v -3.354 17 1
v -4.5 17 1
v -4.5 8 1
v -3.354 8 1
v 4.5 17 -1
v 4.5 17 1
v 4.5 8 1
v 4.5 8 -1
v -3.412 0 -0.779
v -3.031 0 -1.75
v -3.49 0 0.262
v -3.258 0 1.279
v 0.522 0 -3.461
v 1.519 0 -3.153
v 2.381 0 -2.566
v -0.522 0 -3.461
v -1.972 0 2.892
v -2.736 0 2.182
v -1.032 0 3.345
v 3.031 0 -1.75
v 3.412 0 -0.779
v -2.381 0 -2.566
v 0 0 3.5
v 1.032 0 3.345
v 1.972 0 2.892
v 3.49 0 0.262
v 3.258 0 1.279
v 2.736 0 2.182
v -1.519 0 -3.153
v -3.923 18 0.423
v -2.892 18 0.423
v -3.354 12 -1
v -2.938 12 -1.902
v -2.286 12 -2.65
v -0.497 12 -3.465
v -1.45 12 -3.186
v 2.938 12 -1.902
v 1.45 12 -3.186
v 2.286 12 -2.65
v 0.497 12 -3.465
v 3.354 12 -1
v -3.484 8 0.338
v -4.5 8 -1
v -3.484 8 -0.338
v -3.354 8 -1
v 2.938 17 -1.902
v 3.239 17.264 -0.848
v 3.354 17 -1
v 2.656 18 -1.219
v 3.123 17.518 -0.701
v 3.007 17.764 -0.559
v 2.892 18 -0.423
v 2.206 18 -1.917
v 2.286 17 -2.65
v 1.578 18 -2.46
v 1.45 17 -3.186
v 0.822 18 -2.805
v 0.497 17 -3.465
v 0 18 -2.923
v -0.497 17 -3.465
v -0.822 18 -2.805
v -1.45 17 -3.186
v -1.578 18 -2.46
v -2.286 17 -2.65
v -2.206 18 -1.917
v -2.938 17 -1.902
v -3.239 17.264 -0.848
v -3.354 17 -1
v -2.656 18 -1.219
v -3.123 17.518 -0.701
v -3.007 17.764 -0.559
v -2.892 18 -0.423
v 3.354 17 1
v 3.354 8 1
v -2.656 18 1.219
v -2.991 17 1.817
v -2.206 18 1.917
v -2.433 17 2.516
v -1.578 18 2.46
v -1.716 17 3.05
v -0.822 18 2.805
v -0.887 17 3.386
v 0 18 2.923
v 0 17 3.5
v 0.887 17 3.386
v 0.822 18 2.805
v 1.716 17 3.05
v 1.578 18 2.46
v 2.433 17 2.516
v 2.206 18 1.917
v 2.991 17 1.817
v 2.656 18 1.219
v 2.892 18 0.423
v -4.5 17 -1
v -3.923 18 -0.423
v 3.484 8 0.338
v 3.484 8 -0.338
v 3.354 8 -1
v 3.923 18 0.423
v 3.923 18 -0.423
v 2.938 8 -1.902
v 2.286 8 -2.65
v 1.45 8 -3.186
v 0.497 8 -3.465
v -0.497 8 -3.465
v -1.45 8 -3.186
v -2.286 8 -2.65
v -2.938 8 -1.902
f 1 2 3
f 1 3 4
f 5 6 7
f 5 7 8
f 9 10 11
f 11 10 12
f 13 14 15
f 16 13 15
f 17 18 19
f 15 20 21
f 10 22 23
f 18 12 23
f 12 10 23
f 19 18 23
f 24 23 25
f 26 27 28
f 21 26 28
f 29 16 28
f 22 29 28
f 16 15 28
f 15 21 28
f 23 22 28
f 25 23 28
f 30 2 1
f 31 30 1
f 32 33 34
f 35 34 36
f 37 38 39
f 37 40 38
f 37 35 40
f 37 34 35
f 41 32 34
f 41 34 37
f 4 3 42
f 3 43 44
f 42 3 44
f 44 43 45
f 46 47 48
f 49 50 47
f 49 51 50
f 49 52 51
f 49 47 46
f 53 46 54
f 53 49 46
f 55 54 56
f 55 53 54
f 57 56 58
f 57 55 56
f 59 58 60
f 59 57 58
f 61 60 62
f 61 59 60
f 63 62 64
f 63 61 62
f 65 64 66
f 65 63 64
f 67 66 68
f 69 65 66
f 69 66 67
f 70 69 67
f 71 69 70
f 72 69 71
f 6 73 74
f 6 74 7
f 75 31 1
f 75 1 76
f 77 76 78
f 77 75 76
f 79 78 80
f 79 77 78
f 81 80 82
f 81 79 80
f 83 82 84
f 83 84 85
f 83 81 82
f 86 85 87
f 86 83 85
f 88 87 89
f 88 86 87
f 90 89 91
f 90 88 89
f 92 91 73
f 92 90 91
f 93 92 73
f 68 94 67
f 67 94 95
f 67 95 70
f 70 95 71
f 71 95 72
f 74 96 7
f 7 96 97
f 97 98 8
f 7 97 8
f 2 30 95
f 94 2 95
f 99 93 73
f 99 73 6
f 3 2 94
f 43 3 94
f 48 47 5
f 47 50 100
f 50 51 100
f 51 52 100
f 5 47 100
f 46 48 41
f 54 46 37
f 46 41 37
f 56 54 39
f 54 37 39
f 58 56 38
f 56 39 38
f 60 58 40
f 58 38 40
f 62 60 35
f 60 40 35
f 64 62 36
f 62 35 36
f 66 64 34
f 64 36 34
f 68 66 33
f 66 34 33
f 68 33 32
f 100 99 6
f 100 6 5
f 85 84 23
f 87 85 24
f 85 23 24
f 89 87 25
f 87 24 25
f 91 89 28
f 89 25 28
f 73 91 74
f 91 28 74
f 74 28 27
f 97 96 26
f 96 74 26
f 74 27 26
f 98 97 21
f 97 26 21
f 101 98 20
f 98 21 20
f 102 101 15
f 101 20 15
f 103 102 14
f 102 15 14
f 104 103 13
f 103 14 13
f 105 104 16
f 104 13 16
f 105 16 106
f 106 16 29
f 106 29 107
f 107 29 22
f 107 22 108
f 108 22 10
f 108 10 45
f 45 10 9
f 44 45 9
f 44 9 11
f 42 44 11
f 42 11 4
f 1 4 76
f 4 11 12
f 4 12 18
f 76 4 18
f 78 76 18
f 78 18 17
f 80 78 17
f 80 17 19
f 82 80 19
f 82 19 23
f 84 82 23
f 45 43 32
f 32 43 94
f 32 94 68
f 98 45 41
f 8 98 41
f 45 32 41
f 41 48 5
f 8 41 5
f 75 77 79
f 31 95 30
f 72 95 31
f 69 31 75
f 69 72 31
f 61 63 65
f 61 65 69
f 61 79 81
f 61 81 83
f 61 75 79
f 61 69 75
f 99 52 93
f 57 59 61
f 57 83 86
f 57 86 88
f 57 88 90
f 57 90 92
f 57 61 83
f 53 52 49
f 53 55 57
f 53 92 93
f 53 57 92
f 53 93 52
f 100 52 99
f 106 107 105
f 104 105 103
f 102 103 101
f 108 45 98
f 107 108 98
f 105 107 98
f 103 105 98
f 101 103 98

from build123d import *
from OCP.BRepFilletAPI import BRepFilletAPI_MakeChamfer

# Parameters (mm, degrees)
SKETCH1_R           = 3.5
BOSS_EXTRUDE1_DEPTH = 18
SKETCH2_W           = 9
SKETCH2_H           = 2
BOSS_EXTRUDE3_DEPTH = 10
CUT_EXTRUDE3_START  = -8
SKETCH3_W           = 10
SKETCH3_H           = 2.5
CUT_EXTRUDE3_DEPTH  = 4
CHAMFER1_SIZE       = 1
CHAMFER1_SIZE2      = 0.577350269


with BuildPart() as part:
    # Sketch1 → Boss-Extrude1 (new body)
    with BuildSketch(Plane(origin=(0, 0, 0), x_dir=(1, 0, 0), z_dir=(0, 1, 0))):
        with Locations(Location((0, 0, 0), (0, 0, 270))):
            Circle(SKETCH1_R)
    extrude(amount=BOSS_EXTRUDE1_DEPTH)

    # Sketch2 → Boss-Extrude3 (add)
    with BuildSketch(Plane(origin=(0, 18, 0), x_dir=(1, 0, 0), z_dir=(0, 1, 0))):
        Rectangle(SKETCH2_W, SKETCH2_H)
    extrude(amount=-BOSS_EXTRUDE3_DEPTH)

    # Sketch3 → Cut-Extrude3 (cut)
    with BuildSketch(Plane.XZ.offset(CUT_EXTRUDE3_START)):
        with Locations((0, -2.25)):
            Rectangle(SKETCH3_W, SKETCH3_H)
    extrude(amount=-CUT_EXTRUDE3_DEPTH, mode=Mode.SUBTRACT)

    # Chamfer1: one chamfer whose edges measure the first distance from different faces: ONE call of the kernel's chamfer builder (chamfer() names one face for all edges)
    chamfer1_edges_1 = [part.edges().sort_by_distance(p)[0] for p in [
        (3.927050983, 18, -1),
        (-3.927050983, 18, -1),
    ]]
    chamfer1_side_1 = [part.faces().sort_by_distance(p)[0] for p in [
        (0, 11.381966011, -1),
    ]]
    chamfer1_edges_2 = [part.edges().sort_by_distance(p)[0] for p in [
        (3.927050983, 18, 1),
    ]]
    chamfer1_side_2 = [part.faces().sort_by_distance(p)[0] for p in [
        (3.927050983, 13, 1),
    ]]
    chamfer1_edges_3 = [part.edges().sort_by_distance(p)[0] for p in [
        (4.5, 18, 0),
    ]]
    chamfer1_side_3 = [part.faces().sort_by_distance(p)[0] for p in [
        (4.5, 13, 0),
    ]]
    chamfer1_edges_4 = [part.edges().sort_by_distance(p)[0] for p in [
        (-3.927050983, 18, 1),
    ]]
    chamfer1_side_4 = [part.faces().sort_by_distance(p)[0] for p in [
        (-3.927050983, 13, 1),
    ]]
    chamfer1_edges_5 = [part.edges().sort_by_distance(p)[0] for p in [
        (-4.5, 18, 0),
    ]]
    chamfer1_side_5 = [part.faces().sort_by_distance(p)[0] for p in [
        (-4.5, 13, 0),
    ]]
    chamfer1_edges_6 = [part.edges().sort_by_distance(p)[0] for p in [
        (0, 18, -3.5),
    ]]
    chamfer1_side_6 = [part.faces().sort_by_distance(p)[0] for p in [
        (0, 15, -3.5),
    ]]
    chamfer1_edges_7 = [part.edges().sort_by_distance(p)[0] for p in [
        (2.091650066, 18, 2.80624304),
    ]]
    chamfer1_side_7 = [part.faces().sort_by_distance(p)[0] for p in [
        (0, 9, -3.5),
    ]]
    chamfer1 = BRepFilletAPI_MakeChamfer(part.part.solid().wrapped)
    for e in chamfer1_edges_1:
        chamfer1.Add(CHAMFER1_SIZE, CHAMFER1_SIZE2, e.wrapped, chamfer1_side_1[0].wrapped)  # the first distance lies on this face
    for e in chamfer1_edges_2:
        chamfer1.Add(CHAMFER1_SIZE, CHAMFER1_SIZE2, e.wrapped, chamfer1_side_2[0].wrapped)  # the first distance lies on this face
    for e in chamfer1_edges_3:
        chamfer1.Add(CHAMFER1_SIZE, CHAMFER1_SIZE2, e.wrapped, chamfer1_side_3[0].wrapped)  # the first distance lies on this face
    for e in chamfer1_edges_4:
        chamfer1.Add(CHAMFER1_SIZE, CHAMFER1_SIZE2, e.wrapped, chamfer1_side_4[0].wrapped)  # the first distance lies on this face
    for e in chamfer1_edges_5:
        chamfer1.Add(CHAMFER1_SIZE, CHAMFER1_SIZE2, e.wrapped, chamfer1_side_5[0].wrapped)  # the first distance lies on this face
    for e in chamfer1_edges_6:
        chamfer1.Add(CHAMFER1_SIZE, CHAMFER1_SIZE2, e.wrapped, chamfer1_side_6[0].wrapped)  # the first distance lies on this face
    for e in chamfer1_edges_7:
        chamfer1.Add(CHAMFER1_SIZE, CHAMFER1_SIZE2, e.wrapped, chamfer1_side_7[0].wrapped)  # the first distance lies on this face
    add(Compound.cast(chamfer1.Shape()), mode=Mode.REPLACE)


solid = part.part
